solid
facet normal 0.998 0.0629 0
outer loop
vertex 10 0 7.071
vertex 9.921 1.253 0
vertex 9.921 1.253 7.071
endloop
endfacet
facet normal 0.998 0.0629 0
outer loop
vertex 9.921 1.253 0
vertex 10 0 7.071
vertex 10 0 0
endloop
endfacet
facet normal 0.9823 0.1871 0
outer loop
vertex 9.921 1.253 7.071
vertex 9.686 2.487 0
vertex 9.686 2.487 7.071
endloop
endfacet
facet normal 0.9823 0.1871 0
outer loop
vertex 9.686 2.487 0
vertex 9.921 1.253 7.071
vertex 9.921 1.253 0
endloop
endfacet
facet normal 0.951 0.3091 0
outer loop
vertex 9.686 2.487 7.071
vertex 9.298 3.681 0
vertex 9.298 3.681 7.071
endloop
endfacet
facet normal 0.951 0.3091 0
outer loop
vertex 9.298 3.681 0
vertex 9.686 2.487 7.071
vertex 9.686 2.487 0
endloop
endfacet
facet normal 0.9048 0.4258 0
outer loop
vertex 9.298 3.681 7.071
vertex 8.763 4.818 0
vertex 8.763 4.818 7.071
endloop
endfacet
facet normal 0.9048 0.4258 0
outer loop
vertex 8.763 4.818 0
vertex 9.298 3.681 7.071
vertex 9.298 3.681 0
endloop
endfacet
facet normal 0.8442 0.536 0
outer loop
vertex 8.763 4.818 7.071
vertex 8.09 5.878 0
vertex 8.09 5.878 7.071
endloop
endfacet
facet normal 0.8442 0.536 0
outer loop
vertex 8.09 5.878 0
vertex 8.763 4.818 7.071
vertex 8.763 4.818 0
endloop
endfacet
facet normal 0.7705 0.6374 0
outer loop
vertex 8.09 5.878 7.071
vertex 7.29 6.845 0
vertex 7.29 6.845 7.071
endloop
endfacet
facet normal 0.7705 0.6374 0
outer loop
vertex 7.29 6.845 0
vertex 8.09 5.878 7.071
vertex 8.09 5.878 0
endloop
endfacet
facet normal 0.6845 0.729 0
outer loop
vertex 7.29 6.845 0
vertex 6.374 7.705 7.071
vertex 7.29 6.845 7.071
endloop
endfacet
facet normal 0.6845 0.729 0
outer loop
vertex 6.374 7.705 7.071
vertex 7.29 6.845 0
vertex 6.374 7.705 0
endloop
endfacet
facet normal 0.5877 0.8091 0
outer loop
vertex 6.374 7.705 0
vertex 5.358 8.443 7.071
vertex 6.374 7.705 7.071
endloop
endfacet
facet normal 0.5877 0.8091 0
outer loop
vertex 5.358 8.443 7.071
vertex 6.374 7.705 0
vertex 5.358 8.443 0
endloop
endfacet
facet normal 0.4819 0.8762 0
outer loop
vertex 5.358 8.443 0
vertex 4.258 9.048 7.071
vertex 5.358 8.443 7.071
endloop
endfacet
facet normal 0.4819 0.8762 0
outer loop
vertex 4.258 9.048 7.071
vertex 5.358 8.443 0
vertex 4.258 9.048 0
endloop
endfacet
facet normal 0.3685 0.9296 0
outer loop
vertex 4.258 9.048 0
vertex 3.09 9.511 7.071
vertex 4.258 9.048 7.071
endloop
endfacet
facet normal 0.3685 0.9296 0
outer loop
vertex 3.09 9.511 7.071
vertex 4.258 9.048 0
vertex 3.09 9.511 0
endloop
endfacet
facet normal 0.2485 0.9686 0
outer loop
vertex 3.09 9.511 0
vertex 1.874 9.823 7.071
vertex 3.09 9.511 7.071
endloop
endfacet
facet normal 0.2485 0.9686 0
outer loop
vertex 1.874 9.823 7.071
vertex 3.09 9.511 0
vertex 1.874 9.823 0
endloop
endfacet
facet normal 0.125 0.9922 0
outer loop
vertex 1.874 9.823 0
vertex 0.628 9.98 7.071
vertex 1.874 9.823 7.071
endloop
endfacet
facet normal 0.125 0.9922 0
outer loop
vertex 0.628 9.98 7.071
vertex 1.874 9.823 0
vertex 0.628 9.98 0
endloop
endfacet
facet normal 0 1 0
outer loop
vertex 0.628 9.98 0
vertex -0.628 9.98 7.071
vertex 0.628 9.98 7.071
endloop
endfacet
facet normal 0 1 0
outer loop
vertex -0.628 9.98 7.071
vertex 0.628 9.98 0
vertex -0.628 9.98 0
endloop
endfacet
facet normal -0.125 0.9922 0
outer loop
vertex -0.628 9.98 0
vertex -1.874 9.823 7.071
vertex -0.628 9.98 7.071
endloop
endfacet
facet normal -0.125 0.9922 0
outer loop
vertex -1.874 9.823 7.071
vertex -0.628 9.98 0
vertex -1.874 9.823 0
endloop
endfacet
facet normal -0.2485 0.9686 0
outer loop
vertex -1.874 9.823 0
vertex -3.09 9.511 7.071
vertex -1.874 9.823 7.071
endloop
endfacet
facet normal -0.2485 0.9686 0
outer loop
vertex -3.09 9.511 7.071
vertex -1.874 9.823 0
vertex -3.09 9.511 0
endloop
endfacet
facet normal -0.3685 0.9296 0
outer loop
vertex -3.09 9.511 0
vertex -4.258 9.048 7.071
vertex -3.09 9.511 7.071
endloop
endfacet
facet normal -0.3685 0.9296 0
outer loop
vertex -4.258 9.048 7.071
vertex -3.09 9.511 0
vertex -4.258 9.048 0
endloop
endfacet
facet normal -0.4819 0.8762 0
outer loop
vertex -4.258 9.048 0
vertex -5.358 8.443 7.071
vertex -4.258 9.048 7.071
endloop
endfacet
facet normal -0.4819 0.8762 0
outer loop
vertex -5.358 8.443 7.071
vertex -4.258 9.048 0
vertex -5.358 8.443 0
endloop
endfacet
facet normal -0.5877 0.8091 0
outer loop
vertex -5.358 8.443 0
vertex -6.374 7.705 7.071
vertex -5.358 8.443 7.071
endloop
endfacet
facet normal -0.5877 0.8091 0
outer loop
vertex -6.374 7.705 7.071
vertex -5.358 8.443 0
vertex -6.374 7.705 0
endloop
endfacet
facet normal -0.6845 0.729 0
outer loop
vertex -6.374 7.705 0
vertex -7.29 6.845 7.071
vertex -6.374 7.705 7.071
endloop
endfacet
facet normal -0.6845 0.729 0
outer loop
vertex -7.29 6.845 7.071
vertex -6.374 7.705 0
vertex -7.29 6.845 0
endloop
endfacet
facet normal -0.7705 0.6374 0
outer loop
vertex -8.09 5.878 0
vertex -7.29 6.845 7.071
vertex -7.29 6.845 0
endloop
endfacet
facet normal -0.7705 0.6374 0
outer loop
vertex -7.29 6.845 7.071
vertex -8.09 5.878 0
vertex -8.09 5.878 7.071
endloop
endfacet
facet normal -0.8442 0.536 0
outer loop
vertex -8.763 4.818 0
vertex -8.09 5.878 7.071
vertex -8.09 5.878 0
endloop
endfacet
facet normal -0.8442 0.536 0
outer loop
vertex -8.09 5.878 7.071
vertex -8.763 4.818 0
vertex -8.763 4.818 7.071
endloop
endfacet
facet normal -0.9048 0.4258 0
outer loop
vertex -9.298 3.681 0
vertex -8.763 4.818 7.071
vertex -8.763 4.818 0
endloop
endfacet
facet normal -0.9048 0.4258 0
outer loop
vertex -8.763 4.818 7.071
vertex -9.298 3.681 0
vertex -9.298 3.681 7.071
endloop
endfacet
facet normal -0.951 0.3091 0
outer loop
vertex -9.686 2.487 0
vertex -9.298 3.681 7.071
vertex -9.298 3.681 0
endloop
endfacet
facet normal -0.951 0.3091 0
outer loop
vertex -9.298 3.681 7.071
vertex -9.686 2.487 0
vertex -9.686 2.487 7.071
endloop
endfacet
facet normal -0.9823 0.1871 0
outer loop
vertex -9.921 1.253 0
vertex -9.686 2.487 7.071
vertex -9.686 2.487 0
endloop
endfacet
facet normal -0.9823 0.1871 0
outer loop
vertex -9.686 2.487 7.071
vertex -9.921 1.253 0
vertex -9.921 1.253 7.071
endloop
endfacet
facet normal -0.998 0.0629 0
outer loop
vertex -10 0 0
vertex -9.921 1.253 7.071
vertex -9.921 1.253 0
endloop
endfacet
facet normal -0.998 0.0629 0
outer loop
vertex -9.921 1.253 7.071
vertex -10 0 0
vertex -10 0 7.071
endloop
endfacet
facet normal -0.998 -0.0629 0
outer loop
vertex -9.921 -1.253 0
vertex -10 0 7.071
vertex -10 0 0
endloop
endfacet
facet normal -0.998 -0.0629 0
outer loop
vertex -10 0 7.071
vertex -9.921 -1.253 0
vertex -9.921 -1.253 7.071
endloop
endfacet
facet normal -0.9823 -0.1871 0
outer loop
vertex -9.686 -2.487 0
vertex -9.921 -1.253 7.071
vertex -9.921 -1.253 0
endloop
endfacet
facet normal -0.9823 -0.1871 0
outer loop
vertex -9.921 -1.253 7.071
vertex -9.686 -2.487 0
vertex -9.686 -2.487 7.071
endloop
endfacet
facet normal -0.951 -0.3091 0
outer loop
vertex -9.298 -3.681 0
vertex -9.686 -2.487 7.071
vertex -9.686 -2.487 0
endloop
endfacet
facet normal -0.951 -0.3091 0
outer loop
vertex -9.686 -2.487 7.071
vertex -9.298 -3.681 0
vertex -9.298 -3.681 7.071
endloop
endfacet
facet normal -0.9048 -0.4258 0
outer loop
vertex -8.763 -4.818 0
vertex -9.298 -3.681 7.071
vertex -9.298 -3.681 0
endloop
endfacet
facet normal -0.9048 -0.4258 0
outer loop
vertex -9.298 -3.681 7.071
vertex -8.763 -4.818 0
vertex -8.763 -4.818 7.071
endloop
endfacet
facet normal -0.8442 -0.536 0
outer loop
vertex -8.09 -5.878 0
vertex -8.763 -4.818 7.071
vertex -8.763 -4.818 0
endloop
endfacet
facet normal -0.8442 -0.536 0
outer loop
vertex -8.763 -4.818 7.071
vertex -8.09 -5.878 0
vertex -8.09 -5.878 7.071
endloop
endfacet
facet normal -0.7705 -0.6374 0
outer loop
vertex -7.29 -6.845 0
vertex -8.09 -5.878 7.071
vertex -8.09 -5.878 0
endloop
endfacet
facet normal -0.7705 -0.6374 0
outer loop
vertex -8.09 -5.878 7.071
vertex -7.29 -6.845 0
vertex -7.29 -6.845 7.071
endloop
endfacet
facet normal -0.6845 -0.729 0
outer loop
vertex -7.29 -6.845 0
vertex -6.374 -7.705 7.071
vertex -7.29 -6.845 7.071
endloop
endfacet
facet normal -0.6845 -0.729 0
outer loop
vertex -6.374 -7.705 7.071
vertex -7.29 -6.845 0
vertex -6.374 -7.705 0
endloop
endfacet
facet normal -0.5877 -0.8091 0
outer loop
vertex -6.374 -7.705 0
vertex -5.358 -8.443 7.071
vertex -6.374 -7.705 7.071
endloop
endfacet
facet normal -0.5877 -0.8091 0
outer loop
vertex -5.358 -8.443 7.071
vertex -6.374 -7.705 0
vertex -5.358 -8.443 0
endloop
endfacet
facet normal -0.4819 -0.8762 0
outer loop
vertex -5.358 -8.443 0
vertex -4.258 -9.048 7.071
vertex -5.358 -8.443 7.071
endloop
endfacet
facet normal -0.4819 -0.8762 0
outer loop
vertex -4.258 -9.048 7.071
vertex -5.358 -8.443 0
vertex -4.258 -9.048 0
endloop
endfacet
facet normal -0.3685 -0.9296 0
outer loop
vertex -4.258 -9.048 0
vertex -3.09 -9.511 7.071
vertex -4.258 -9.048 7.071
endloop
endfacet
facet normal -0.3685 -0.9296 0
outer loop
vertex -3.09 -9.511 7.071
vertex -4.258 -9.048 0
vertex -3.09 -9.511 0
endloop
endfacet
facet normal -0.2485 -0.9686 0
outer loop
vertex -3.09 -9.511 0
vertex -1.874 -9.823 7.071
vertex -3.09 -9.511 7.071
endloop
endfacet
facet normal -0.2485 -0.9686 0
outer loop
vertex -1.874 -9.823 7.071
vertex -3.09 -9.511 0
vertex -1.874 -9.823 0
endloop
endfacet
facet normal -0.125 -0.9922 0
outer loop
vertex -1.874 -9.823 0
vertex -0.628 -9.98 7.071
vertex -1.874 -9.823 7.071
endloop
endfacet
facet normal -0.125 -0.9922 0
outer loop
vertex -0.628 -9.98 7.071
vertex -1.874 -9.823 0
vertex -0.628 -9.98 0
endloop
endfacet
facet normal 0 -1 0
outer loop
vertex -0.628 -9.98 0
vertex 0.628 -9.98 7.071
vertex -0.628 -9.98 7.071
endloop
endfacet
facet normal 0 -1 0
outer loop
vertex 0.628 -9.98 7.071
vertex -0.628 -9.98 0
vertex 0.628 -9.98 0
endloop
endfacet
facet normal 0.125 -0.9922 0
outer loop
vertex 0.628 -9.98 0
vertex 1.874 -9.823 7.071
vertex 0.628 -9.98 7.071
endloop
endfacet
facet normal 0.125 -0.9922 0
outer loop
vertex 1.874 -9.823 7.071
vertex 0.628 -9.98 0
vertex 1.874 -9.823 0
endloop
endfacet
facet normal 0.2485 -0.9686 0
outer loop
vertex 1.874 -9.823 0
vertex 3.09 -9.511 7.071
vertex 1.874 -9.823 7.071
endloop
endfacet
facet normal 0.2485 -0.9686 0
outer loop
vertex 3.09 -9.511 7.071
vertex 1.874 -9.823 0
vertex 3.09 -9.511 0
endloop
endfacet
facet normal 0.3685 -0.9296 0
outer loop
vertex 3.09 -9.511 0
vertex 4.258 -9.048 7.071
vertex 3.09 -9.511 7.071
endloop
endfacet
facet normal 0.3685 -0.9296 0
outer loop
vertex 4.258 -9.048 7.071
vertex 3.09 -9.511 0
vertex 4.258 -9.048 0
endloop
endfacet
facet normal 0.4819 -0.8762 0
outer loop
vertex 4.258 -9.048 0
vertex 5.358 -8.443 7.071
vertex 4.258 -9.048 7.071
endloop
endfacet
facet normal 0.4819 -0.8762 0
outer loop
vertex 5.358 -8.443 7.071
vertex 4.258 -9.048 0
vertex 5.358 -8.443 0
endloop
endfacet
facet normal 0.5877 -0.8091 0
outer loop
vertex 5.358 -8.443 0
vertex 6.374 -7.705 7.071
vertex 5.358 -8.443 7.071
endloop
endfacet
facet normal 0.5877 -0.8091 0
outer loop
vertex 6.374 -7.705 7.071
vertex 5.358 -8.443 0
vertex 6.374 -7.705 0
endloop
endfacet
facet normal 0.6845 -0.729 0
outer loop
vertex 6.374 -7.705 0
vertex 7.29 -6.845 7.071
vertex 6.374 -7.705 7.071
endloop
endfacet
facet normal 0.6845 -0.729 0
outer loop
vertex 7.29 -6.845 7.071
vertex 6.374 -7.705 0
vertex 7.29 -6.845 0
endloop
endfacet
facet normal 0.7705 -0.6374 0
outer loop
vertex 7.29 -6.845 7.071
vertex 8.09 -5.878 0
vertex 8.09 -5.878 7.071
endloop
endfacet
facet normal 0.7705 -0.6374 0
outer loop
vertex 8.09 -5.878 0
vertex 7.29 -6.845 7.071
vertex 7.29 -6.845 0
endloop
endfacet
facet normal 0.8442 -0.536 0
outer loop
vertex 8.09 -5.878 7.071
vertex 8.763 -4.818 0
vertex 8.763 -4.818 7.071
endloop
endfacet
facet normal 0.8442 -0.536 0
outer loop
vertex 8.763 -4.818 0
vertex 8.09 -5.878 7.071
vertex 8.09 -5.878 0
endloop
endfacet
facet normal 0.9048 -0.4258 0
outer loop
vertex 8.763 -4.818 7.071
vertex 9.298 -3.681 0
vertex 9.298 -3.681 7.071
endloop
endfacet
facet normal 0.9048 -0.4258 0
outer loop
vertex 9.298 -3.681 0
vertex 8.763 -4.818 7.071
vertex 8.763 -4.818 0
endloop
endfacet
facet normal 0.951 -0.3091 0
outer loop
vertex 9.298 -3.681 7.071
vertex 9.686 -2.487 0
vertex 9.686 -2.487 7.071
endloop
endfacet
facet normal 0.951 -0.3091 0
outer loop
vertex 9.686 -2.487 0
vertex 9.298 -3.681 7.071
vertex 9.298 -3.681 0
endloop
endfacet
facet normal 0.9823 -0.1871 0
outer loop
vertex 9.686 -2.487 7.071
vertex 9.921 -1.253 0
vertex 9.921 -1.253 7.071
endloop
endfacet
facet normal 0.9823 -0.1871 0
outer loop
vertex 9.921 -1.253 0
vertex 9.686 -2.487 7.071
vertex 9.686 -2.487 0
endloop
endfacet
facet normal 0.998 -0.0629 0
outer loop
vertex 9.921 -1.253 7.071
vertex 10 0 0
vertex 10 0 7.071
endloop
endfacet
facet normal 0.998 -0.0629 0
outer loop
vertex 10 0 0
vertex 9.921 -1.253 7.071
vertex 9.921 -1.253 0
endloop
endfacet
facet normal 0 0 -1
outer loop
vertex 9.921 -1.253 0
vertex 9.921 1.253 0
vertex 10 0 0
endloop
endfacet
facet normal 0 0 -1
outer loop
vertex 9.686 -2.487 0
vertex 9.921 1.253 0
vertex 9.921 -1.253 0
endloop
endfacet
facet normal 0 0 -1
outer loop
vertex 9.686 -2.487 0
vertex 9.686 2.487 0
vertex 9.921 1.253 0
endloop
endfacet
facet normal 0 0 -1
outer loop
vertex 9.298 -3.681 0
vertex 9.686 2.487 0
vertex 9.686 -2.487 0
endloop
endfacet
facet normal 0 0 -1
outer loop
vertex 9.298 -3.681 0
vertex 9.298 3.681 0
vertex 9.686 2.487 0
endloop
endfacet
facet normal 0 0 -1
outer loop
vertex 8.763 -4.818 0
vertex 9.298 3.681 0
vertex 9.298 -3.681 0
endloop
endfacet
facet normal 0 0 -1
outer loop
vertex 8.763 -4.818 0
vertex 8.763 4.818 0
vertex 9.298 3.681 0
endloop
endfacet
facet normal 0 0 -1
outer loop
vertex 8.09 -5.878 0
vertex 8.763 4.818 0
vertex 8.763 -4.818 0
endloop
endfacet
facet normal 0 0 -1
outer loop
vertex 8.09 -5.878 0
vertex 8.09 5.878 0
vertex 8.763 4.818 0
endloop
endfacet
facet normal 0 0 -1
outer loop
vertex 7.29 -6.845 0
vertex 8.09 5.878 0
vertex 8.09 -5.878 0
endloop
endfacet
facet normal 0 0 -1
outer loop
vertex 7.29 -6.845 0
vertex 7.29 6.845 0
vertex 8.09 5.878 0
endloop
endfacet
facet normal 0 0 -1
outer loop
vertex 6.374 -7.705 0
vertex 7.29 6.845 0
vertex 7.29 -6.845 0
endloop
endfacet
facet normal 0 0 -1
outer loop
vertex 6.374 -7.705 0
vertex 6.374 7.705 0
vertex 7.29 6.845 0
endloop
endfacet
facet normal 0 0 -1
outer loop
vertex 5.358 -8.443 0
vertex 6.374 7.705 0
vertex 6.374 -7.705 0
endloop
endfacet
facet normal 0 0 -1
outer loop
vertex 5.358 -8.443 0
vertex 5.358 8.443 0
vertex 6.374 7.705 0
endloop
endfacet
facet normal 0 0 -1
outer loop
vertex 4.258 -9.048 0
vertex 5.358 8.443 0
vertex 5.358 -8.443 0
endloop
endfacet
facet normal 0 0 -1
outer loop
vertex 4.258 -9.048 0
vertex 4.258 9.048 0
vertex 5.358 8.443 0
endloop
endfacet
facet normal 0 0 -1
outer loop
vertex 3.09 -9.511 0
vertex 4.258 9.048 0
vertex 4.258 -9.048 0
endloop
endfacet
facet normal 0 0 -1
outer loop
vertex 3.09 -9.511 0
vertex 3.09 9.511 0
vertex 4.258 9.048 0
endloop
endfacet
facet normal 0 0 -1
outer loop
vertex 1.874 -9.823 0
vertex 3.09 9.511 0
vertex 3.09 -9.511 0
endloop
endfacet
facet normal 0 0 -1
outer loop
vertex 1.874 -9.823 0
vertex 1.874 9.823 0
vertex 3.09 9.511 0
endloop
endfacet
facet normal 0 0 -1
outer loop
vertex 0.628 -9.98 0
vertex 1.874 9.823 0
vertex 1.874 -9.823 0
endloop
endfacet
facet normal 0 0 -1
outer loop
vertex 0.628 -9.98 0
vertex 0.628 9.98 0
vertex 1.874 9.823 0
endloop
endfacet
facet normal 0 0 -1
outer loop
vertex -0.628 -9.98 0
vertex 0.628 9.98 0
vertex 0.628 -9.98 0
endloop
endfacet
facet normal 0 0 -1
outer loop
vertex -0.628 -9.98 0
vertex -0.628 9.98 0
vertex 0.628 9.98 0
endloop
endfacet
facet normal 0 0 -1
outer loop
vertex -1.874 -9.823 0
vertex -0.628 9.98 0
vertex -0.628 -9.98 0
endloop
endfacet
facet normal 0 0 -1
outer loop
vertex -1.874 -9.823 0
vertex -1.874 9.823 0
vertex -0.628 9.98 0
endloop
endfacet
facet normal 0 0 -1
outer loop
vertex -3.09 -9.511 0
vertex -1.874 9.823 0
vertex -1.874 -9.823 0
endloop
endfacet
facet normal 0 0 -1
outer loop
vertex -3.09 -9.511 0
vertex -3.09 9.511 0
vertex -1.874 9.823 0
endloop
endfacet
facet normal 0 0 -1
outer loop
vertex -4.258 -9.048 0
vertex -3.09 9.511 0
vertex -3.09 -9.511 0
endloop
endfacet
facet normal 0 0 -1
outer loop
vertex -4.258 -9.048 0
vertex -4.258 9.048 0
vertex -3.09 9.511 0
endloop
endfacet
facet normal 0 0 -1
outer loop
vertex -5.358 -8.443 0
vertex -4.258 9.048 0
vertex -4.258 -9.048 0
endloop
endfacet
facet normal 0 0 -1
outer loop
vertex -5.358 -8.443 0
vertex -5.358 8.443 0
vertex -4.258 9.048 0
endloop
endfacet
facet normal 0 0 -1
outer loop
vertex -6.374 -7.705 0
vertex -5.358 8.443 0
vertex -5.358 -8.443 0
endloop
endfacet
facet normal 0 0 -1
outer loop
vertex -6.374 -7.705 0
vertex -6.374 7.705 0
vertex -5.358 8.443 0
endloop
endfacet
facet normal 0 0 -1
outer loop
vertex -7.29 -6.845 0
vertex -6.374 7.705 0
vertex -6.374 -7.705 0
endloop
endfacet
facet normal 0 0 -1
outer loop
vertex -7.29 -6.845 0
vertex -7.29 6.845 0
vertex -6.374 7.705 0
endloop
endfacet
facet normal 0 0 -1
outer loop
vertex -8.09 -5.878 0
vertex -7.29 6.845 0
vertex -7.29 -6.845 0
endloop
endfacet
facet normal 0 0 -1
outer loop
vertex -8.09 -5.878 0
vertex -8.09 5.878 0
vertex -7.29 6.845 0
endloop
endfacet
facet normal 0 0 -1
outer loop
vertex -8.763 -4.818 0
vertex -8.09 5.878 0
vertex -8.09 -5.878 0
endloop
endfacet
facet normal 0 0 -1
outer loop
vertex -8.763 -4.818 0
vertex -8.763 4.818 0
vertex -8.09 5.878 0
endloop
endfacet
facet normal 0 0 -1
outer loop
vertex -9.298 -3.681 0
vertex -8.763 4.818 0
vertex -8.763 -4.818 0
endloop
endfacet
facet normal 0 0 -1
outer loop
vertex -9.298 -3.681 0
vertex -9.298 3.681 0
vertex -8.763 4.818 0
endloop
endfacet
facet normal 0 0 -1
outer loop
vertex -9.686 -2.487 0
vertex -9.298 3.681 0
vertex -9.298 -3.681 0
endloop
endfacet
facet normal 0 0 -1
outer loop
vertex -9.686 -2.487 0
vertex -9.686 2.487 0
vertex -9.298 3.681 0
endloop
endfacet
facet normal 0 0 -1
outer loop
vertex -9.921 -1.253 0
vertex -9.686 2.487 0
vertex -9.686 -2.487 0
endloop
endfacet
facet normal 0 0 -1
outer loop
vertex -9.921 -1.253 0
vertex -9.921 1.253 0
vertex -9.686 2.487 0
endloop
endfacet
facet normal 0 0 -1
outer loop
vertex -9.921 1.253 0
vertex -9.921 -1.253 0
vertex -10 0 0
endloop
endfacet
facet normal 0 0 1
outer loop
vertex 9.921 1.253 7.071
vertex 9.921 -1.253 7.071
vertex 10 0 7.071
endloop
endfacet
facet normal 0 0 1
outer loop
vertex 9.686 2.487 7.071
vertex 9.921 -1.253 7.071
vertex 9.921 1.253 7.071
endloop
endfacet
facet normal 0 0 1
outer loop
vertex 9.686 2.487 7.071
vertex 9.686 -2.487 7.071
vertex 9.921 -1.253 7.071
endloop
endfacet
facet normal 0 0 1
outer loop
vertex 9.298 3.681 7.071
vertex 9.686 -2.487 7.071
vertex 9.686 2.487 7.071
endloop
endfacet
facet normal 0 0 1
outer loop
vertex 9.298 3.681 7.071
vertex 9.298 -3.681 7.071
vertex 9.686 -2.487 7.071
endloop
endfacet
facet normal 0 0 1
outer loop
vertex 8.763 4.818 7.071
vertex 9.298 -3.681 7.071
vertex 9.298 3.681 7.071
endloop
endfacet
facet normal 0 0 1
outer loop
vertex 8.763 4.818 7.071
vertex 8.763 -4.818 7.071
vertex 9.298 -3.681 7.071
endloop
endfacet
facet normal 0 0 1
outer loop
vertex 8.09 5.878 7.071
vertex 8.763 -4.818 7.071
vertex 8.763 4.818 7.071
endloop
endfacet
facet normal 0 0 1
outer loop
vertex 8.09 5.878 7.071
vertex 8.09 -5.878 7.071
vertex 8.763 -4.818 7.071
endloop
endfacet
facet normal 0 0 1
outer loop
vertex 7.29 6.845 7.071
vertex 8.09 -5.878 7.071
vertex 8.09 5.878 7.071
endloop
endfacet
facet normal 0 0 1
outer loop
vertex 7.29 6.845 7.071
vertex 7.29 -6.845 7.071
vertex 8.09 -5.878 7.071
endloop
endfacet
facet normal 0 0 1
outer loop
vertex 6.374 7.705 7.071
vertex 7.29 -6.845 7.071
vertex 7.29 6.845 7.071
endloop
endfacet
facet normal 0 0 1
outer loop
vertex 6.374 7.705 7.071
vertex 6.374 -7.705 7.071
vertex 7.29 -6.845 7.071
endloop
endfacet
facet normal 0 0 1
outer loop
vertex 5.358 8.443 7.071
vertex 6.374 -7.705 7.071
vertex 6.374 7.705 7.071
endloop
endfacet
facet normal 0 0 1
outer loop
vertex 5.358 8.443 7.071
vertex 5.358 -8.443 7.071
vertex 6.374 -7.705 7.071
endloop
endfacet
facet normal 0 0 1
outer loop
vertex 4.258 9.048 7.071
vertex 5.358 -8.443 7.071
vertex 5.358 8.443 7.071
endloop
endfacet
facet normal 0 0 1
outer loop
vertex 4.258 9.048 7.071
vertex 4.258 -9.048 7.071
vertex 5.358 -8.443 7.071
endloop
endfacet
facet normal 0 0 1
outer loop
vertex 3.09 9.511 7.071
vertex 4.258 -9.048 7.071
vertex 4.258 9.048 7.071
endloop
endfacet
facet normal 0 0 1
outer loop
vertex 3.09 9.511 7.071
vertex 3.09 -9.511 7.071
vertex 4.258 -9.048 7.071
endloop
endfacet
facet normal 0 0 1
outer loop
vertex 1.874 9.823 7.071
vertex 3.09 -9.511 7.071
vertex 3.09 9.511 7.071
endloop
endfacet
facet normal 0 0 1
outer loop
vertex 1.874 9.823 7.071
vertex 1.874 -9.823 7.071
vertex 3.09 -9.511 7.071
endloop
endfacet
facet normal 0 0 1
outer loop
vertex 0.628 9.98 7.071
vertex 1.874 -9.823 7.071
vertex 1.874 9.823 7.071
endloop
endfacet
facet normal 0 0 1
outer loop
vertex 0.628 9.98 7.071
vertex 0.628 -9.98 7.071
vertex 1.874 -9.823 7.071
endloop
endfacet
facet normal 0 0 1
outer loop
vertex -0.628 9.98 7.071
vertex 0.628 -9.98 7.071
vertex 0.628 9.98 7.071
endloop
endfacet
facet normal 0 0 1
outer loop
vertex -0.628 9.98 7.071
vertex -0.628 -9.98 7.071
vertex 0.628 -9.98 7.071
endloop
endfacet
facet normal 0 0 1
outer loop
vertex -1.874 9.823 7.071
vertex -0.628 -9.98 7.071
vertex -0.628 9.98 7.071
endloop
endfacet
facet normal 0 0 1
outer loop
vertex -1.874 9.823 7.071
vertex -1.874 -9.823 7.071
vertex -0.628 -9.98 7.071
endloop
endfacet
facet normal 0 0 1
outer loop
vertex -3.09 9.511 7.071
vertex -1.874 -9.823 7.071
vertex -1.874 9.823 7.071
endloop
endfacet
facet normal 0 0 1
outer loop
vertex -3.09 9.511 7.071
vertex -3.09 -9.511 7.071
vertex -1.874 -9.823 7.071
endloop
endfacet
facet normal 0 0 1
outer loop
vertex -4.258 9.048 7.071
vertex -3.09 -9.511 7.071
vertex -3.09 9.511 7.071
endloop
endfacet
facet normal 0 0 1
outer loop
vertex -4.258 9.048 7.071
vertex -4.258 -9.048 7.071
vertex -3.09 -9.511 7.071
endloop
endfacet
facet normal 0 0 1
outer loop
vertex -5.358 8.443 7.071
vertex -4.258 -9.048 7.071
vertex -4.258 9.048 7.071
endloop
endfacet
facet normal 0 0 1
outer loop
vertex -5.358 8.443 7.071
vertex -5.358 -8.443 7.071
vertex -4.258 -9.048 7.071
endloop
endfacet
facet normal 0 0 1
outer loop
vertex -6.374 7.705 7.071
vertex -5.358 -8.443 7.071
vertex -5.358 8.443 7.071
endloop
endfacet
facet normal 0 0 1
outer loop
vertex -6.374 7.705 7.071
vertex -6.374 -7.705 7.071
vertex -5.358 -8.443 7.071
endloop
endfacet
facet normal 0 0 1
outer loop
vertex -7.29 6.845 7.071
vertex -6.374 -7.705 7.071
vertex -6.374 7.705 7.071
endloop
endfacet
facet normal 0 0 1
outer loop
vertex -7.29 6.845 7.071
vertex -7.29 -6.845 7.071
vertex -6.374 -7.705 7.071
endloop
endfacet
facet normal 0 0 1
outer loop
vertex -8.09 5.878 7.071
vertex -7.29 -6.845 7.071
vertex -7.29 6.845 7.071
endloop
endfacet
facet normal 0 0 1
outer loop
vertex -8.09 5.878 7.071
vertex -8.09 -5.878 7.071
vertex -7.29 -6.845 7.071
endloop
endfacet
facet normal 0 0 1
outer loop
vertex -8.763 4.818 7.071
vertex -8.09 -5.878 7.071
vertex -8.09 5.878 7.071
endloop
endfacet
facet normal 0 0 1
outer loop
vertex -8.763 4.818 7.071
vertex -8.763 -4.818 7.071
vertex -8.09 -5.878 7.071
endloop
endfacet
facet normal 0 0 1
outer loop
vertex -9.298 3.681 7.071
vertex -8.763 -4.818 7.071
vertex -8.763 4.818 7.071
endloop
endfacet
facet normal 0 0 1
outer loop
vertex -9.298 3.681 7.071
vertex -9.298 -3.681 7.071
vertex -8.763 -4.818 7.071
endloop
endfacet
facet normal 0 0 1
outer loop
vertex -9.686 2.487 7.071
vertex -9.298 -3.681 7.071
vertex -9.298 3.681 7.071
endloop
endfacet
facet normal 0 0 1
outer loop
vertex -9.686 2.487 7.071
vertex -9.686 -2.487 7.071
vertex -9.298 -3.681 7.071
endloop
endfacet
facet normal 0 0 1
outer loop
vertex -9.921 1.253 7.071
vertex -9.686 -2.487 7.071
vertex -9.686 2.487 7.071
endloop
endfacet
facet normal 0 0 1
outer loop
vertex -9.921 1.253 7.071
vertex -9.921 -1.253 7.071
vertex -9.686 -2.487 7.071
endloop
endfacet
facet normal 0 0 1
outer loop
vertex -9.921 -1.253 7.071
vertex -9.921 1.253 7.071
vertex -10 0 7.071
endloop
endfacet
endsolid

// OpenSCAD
// mathgrrl cylinder coins
// for Matt Parker and Katie Steckles

/////////////////////////////////////////////////////////////////////////////
// PARAMETERS

// resolution 
$fn = 50*1;

// diameter of the coin
d = 20;
r = d/2;

// select from popular thickness-to-diameter ratios
ratio = 2.82843; // [2.82843:1 to 2*sqrt(2), 2.7182818:1 to e, 2.3333333:1 to 7/3, 2:1 to 2, 1.7320508:1 to sqrt(3), 0:Enter Custom Ratio Below]

// only use if "custom" selected above; enter 1 to ?? ratio
custom = 0;

// set rainal ratio to be custom if ratio=0, and ratio otherwise
final = (ratio == 0) ? custom : ratio;

// thickness based on ratio
thickness = d/final;

/////////////////////////////////////////////////////////////////////////////
// RENDERS

cylinder(thickness,r,r);
